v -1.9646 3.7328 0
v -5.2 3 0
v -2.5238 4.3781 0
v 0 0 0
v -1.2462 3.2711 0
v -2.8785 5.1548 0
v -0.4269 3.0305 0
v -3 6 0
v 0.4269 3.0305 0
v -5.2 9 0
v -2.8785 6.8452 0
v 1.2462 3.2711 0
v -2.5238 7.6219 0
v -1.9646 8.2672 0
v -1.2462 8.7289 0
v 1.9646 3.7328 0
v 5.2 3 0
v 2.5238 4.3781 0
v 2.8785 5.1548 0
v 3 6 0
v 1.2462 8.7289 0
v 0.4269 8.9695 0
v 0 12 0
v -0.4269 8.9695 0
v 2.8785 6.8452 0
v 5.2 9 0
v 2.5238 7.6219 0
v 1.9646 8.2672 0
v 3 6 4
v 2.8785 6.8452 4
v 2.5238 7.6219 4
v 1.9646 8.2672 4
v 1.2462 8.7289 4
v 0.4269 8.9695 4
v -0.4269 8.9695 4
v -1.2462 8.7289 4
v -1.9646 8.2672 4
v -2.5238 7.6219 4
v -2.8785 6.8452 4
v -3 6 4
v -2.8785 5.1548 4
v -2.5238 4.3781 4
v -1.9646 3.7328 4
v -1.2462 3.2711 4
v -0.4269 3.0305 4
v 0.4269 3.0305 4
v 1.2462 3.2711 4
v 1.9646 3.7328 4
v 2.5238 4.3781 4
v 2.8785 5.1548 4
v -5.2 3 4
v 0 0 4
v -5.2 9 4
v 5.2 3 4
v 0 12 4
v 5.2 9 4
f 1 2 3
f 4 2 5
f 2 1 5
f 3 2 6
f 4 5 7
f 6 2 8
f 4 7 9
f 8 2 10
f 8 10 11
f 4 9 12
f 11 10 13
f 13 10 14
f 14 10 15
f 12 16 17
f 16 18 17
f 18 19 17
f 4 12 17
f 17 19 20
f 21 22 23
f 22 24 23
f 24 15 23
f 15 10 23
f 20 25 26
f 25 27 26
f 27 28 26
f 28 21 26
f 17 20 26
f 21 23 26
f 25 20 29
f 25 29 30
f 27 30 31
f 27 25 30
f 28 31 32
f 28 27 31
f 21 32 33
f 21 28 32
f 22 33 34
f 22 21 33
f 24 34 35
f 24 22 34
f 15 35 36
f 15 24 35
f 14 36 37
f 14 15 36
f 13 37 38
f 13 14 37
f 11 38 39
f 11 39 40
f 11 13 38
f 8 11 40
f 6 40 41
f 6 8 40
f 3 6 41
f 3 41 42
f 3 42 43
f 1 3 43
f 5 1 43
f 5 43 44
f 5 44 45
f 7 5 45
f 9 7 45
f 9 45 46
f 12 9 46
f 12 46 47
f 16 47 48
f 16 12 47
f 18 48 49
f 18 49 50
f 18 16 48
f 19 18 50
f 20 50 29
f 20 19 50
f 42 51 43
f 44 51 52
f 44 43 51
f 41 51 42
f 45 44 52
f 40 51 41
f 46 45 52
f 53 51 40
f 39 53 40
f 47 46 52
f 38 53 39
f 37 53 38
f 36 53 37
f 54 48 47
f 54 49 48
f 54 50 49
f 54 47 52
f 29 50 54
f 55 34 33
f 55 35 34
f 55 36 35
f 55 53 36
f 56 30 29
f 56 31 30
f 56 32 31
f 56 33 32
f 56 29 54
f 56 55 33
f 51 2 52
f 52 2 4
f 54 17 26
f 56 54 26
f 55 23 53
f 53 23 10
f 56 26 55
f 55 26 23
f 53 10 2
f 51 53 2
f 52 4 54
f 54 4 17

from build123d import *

# Parameters (mm, degrees)
CROQUIS1_R              = 3
SALIENTE_EXTRUIR1_DEPTH = 4


with BuildPart() as part:
    # Croquis1 → Saliente-Extruir1 (new body)
    with BuildSketch(Plane.XY):
        Polygon((5.2, 3), (5.2, 9), (0, 12), (-5.2, 9), (-5.2, 3), (0, 0), align=None)
        with Locations((0, 6)):
            Circle(CROQUIS1_R, mode=Mode.SUBTRACT)
    extrude(amount=SALIENTE_EXTRUIR1_DEPTH)


solid = part.part
